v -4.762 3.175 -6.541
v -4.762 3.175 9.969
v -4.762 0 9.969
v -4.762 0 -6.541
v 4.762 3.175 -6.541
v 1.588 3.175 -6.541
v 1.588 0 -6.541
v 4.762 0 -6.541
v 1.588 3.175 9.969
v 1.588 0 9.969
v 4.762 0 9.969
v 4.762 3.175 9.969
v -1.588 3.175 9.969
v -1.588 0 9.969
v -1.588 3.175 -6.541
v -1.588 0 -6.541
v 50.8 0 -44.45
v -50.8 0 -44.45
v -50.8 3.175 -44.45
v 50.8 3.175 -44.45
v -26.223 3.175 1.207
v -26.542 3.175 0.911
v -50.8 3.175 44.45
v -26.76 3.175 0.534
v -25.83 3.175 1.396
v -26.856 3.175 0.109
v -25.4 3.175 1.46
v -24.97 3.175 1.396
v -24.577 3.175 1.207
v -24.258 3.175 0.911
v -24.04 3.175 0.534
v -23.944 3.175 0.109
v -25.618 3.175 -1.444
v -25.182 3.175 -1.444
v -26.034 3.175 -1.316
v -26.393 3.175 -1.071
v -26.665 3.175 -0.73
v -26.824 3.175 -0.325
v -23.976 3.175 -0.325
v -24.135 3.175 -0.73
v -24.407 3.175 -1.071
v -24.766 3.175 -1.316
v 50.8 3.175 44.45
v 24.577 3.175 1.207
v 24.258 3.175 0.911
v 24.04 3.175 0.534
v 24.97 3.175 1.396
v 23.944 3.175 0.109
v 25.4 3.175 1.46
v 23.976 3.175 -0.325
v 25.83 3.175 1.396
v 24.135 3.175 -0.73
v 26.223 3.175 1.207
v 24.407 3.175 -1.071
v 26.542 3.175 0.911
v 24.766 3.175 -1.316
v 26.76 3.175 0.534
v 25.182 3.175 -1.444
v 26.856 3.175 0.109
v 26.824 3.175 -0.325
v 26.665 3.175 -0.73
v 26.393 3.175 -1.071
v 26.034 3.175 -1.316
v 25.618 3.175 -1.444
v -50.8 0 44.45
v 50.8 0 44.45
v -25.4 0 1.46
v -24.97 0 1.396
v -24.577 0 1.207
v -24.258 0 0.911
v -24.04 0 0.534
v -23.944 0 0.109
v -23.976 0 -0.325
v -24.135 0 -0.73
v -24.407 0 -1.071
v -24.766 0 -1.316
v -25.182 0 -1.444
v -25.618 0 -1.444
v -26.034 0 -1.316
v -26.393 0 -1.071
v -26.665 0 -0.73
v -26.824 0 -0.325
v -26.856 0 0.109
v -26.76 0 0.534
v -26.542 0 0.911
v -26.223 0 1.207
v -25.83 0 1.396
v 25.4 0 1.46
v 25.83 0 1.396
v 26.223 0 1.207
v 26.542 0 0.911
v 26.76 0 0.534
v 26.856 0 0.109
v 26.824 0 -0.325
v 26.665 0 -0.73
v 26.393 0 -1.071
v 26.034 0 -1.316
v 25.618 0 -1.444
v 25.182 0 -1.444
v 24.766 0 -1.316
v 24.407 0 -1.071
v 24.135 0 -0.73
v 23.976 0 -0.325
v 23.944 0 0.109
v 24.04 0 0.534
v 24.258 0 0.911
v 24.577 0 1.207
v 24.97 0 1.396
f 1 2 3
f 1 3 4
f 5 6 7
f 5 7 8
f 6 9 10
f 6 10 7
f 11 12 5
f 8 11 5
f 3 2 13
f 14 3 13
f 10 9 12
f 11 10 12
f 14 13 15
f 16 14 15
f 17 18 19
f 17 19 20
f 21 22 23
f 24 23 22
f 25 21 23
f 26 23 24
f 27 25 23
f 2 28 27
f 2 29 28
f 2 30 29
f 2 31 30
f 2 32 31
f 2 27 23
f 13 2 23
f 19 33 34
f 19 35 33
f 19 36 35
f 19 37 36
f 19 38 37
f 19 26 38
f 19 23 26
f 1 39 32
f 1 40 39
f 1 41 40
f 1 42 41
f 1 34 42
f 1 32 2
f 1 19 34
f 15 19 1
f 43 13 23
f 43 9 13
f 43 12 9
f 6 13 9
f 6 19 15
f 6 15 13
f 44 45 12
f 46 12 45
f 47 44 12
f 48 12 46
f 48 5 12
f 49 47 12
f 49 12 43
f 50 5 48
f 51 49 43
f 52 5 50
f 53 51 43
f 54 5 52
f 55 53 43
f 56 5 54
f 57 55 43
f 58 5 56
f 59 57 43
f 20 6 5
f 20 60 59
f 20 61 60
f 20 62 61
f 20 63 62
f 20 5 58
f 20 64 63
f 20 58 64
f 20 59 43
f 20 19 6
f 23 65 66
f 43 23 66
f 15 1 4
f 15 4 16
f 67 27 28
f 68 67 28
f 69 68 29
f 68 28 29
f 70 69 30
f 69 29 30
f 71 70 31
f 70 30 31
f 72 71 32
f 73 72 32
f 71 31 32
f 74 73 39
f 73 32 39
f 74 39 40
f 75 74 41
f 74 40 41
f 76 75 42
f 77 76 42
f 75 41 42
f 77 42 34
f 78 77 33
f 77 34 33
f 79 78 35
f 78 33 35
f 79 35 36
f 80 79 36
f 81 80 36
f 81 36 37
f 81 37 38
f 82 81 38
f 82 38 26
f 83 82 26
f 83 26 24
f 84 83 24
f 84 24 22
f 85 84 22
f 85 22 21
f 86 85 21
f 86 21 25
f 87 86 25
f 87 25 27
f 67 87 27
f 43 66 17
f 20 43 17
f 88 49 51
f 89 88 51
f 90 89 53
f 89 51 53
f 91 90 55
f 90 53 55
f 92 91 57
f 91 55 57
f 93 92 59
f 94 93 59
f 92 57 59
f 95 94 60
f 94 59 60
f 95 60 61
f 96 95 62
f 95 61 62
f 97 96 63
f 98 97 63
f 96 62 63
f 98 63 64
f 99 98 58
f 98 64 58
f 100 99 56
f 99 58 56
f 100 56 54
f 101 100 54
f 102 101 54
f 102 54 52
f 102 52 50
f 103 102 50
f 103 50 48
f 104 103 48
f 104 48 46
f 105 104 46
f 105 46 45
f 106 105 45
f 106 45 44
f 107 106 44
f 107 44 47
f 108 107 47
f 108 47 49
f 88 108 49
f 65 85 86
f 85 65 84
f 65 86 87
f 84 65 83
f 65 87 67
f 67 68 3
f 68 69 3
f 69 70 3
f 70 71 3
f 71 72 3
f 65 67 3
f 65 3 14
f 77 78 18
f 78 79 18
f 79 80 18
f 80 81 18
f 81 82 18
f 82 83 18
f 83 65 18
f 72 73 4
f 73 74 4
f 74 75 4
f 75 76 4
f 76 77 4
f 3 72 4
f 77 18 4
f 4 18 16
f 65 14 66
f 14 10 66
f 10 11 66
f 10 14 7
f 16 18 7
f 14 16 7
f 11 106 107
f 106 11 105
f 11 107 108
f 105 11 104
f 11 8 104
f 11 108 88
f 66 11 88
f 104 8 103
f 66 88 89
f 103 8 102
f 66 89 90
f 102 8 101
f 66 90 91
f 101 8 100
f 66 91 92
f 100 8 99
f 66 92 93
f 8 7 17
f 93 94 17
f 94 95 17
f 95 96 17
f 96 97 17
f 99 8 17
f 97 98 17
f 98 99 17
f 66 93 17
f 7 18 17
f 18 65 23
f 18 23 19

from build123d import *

# Parameters (mm, degrees)
SKETCH2_W           = 101.6
SKETCH2_H           = 88.9
BOSS_EXTRUDE1_DEPTH = 3.175
SKETCH3_R           = 1.4605
CUT_EXTRUDE1_DEPTH  = 68.576054376
SKETCH5_W           = 3.175
SKETCH5_H           = 16.51
CUT_EXTRUDE2_DEPTH  = 68.576054376


with BuildPart() as part:
    # Sketch2 → Boss-Extrude1 (new body)
    with BuildSketch(Plane(origin=(0, 0, 0), x_dir=(1, 0, 0), z_dir=(0, 1, 0))):
        Rectangle(SKETCH2_W, SKETCH2_H)
    extrude(amount=BOSS_EXTRUDE1_DEPTH)

    # Sketch3 → Cut-Extrude1 (cut, through all)
    with BuildSketch(Plane(origin=(0, 3.175, 0), x_dir=(1, 0, 0), z_dir=(0, 1, 0))):
        with Locations(Location((-25.4, 0, 0), (0, 0, 270))):
            Circle(SKETCH3_R)
        with Locations(Location((25.4, 0, 0), (0, 0, 270))):
            Circle(SKETCH3_R)
    extrude(amount=-CUT_EXTRUDE1_DEPTH, mode=Mode.SUBTRACT)

    # Sketch5 → Cut-Extrude2 (cut, through all)
    with BuildSketch(Plane(origin=(0, 3.175, 0), x_dir=(1, 0, 0), z_dir=(0, 1, 0))):
        with Locations((-3.175, -1.713817512)):
            Rectangle(SKETCH5_W, SKETCH5_H)
        with Locations((3.175, -1.713817512)):
            Rectangle(SKETCH5_W, SKETCH5_H)
    extrude(amount=-CUT_EXTRUDE2_DEPTH, mode=Mode.SUBTRACT)


solid = part.part
